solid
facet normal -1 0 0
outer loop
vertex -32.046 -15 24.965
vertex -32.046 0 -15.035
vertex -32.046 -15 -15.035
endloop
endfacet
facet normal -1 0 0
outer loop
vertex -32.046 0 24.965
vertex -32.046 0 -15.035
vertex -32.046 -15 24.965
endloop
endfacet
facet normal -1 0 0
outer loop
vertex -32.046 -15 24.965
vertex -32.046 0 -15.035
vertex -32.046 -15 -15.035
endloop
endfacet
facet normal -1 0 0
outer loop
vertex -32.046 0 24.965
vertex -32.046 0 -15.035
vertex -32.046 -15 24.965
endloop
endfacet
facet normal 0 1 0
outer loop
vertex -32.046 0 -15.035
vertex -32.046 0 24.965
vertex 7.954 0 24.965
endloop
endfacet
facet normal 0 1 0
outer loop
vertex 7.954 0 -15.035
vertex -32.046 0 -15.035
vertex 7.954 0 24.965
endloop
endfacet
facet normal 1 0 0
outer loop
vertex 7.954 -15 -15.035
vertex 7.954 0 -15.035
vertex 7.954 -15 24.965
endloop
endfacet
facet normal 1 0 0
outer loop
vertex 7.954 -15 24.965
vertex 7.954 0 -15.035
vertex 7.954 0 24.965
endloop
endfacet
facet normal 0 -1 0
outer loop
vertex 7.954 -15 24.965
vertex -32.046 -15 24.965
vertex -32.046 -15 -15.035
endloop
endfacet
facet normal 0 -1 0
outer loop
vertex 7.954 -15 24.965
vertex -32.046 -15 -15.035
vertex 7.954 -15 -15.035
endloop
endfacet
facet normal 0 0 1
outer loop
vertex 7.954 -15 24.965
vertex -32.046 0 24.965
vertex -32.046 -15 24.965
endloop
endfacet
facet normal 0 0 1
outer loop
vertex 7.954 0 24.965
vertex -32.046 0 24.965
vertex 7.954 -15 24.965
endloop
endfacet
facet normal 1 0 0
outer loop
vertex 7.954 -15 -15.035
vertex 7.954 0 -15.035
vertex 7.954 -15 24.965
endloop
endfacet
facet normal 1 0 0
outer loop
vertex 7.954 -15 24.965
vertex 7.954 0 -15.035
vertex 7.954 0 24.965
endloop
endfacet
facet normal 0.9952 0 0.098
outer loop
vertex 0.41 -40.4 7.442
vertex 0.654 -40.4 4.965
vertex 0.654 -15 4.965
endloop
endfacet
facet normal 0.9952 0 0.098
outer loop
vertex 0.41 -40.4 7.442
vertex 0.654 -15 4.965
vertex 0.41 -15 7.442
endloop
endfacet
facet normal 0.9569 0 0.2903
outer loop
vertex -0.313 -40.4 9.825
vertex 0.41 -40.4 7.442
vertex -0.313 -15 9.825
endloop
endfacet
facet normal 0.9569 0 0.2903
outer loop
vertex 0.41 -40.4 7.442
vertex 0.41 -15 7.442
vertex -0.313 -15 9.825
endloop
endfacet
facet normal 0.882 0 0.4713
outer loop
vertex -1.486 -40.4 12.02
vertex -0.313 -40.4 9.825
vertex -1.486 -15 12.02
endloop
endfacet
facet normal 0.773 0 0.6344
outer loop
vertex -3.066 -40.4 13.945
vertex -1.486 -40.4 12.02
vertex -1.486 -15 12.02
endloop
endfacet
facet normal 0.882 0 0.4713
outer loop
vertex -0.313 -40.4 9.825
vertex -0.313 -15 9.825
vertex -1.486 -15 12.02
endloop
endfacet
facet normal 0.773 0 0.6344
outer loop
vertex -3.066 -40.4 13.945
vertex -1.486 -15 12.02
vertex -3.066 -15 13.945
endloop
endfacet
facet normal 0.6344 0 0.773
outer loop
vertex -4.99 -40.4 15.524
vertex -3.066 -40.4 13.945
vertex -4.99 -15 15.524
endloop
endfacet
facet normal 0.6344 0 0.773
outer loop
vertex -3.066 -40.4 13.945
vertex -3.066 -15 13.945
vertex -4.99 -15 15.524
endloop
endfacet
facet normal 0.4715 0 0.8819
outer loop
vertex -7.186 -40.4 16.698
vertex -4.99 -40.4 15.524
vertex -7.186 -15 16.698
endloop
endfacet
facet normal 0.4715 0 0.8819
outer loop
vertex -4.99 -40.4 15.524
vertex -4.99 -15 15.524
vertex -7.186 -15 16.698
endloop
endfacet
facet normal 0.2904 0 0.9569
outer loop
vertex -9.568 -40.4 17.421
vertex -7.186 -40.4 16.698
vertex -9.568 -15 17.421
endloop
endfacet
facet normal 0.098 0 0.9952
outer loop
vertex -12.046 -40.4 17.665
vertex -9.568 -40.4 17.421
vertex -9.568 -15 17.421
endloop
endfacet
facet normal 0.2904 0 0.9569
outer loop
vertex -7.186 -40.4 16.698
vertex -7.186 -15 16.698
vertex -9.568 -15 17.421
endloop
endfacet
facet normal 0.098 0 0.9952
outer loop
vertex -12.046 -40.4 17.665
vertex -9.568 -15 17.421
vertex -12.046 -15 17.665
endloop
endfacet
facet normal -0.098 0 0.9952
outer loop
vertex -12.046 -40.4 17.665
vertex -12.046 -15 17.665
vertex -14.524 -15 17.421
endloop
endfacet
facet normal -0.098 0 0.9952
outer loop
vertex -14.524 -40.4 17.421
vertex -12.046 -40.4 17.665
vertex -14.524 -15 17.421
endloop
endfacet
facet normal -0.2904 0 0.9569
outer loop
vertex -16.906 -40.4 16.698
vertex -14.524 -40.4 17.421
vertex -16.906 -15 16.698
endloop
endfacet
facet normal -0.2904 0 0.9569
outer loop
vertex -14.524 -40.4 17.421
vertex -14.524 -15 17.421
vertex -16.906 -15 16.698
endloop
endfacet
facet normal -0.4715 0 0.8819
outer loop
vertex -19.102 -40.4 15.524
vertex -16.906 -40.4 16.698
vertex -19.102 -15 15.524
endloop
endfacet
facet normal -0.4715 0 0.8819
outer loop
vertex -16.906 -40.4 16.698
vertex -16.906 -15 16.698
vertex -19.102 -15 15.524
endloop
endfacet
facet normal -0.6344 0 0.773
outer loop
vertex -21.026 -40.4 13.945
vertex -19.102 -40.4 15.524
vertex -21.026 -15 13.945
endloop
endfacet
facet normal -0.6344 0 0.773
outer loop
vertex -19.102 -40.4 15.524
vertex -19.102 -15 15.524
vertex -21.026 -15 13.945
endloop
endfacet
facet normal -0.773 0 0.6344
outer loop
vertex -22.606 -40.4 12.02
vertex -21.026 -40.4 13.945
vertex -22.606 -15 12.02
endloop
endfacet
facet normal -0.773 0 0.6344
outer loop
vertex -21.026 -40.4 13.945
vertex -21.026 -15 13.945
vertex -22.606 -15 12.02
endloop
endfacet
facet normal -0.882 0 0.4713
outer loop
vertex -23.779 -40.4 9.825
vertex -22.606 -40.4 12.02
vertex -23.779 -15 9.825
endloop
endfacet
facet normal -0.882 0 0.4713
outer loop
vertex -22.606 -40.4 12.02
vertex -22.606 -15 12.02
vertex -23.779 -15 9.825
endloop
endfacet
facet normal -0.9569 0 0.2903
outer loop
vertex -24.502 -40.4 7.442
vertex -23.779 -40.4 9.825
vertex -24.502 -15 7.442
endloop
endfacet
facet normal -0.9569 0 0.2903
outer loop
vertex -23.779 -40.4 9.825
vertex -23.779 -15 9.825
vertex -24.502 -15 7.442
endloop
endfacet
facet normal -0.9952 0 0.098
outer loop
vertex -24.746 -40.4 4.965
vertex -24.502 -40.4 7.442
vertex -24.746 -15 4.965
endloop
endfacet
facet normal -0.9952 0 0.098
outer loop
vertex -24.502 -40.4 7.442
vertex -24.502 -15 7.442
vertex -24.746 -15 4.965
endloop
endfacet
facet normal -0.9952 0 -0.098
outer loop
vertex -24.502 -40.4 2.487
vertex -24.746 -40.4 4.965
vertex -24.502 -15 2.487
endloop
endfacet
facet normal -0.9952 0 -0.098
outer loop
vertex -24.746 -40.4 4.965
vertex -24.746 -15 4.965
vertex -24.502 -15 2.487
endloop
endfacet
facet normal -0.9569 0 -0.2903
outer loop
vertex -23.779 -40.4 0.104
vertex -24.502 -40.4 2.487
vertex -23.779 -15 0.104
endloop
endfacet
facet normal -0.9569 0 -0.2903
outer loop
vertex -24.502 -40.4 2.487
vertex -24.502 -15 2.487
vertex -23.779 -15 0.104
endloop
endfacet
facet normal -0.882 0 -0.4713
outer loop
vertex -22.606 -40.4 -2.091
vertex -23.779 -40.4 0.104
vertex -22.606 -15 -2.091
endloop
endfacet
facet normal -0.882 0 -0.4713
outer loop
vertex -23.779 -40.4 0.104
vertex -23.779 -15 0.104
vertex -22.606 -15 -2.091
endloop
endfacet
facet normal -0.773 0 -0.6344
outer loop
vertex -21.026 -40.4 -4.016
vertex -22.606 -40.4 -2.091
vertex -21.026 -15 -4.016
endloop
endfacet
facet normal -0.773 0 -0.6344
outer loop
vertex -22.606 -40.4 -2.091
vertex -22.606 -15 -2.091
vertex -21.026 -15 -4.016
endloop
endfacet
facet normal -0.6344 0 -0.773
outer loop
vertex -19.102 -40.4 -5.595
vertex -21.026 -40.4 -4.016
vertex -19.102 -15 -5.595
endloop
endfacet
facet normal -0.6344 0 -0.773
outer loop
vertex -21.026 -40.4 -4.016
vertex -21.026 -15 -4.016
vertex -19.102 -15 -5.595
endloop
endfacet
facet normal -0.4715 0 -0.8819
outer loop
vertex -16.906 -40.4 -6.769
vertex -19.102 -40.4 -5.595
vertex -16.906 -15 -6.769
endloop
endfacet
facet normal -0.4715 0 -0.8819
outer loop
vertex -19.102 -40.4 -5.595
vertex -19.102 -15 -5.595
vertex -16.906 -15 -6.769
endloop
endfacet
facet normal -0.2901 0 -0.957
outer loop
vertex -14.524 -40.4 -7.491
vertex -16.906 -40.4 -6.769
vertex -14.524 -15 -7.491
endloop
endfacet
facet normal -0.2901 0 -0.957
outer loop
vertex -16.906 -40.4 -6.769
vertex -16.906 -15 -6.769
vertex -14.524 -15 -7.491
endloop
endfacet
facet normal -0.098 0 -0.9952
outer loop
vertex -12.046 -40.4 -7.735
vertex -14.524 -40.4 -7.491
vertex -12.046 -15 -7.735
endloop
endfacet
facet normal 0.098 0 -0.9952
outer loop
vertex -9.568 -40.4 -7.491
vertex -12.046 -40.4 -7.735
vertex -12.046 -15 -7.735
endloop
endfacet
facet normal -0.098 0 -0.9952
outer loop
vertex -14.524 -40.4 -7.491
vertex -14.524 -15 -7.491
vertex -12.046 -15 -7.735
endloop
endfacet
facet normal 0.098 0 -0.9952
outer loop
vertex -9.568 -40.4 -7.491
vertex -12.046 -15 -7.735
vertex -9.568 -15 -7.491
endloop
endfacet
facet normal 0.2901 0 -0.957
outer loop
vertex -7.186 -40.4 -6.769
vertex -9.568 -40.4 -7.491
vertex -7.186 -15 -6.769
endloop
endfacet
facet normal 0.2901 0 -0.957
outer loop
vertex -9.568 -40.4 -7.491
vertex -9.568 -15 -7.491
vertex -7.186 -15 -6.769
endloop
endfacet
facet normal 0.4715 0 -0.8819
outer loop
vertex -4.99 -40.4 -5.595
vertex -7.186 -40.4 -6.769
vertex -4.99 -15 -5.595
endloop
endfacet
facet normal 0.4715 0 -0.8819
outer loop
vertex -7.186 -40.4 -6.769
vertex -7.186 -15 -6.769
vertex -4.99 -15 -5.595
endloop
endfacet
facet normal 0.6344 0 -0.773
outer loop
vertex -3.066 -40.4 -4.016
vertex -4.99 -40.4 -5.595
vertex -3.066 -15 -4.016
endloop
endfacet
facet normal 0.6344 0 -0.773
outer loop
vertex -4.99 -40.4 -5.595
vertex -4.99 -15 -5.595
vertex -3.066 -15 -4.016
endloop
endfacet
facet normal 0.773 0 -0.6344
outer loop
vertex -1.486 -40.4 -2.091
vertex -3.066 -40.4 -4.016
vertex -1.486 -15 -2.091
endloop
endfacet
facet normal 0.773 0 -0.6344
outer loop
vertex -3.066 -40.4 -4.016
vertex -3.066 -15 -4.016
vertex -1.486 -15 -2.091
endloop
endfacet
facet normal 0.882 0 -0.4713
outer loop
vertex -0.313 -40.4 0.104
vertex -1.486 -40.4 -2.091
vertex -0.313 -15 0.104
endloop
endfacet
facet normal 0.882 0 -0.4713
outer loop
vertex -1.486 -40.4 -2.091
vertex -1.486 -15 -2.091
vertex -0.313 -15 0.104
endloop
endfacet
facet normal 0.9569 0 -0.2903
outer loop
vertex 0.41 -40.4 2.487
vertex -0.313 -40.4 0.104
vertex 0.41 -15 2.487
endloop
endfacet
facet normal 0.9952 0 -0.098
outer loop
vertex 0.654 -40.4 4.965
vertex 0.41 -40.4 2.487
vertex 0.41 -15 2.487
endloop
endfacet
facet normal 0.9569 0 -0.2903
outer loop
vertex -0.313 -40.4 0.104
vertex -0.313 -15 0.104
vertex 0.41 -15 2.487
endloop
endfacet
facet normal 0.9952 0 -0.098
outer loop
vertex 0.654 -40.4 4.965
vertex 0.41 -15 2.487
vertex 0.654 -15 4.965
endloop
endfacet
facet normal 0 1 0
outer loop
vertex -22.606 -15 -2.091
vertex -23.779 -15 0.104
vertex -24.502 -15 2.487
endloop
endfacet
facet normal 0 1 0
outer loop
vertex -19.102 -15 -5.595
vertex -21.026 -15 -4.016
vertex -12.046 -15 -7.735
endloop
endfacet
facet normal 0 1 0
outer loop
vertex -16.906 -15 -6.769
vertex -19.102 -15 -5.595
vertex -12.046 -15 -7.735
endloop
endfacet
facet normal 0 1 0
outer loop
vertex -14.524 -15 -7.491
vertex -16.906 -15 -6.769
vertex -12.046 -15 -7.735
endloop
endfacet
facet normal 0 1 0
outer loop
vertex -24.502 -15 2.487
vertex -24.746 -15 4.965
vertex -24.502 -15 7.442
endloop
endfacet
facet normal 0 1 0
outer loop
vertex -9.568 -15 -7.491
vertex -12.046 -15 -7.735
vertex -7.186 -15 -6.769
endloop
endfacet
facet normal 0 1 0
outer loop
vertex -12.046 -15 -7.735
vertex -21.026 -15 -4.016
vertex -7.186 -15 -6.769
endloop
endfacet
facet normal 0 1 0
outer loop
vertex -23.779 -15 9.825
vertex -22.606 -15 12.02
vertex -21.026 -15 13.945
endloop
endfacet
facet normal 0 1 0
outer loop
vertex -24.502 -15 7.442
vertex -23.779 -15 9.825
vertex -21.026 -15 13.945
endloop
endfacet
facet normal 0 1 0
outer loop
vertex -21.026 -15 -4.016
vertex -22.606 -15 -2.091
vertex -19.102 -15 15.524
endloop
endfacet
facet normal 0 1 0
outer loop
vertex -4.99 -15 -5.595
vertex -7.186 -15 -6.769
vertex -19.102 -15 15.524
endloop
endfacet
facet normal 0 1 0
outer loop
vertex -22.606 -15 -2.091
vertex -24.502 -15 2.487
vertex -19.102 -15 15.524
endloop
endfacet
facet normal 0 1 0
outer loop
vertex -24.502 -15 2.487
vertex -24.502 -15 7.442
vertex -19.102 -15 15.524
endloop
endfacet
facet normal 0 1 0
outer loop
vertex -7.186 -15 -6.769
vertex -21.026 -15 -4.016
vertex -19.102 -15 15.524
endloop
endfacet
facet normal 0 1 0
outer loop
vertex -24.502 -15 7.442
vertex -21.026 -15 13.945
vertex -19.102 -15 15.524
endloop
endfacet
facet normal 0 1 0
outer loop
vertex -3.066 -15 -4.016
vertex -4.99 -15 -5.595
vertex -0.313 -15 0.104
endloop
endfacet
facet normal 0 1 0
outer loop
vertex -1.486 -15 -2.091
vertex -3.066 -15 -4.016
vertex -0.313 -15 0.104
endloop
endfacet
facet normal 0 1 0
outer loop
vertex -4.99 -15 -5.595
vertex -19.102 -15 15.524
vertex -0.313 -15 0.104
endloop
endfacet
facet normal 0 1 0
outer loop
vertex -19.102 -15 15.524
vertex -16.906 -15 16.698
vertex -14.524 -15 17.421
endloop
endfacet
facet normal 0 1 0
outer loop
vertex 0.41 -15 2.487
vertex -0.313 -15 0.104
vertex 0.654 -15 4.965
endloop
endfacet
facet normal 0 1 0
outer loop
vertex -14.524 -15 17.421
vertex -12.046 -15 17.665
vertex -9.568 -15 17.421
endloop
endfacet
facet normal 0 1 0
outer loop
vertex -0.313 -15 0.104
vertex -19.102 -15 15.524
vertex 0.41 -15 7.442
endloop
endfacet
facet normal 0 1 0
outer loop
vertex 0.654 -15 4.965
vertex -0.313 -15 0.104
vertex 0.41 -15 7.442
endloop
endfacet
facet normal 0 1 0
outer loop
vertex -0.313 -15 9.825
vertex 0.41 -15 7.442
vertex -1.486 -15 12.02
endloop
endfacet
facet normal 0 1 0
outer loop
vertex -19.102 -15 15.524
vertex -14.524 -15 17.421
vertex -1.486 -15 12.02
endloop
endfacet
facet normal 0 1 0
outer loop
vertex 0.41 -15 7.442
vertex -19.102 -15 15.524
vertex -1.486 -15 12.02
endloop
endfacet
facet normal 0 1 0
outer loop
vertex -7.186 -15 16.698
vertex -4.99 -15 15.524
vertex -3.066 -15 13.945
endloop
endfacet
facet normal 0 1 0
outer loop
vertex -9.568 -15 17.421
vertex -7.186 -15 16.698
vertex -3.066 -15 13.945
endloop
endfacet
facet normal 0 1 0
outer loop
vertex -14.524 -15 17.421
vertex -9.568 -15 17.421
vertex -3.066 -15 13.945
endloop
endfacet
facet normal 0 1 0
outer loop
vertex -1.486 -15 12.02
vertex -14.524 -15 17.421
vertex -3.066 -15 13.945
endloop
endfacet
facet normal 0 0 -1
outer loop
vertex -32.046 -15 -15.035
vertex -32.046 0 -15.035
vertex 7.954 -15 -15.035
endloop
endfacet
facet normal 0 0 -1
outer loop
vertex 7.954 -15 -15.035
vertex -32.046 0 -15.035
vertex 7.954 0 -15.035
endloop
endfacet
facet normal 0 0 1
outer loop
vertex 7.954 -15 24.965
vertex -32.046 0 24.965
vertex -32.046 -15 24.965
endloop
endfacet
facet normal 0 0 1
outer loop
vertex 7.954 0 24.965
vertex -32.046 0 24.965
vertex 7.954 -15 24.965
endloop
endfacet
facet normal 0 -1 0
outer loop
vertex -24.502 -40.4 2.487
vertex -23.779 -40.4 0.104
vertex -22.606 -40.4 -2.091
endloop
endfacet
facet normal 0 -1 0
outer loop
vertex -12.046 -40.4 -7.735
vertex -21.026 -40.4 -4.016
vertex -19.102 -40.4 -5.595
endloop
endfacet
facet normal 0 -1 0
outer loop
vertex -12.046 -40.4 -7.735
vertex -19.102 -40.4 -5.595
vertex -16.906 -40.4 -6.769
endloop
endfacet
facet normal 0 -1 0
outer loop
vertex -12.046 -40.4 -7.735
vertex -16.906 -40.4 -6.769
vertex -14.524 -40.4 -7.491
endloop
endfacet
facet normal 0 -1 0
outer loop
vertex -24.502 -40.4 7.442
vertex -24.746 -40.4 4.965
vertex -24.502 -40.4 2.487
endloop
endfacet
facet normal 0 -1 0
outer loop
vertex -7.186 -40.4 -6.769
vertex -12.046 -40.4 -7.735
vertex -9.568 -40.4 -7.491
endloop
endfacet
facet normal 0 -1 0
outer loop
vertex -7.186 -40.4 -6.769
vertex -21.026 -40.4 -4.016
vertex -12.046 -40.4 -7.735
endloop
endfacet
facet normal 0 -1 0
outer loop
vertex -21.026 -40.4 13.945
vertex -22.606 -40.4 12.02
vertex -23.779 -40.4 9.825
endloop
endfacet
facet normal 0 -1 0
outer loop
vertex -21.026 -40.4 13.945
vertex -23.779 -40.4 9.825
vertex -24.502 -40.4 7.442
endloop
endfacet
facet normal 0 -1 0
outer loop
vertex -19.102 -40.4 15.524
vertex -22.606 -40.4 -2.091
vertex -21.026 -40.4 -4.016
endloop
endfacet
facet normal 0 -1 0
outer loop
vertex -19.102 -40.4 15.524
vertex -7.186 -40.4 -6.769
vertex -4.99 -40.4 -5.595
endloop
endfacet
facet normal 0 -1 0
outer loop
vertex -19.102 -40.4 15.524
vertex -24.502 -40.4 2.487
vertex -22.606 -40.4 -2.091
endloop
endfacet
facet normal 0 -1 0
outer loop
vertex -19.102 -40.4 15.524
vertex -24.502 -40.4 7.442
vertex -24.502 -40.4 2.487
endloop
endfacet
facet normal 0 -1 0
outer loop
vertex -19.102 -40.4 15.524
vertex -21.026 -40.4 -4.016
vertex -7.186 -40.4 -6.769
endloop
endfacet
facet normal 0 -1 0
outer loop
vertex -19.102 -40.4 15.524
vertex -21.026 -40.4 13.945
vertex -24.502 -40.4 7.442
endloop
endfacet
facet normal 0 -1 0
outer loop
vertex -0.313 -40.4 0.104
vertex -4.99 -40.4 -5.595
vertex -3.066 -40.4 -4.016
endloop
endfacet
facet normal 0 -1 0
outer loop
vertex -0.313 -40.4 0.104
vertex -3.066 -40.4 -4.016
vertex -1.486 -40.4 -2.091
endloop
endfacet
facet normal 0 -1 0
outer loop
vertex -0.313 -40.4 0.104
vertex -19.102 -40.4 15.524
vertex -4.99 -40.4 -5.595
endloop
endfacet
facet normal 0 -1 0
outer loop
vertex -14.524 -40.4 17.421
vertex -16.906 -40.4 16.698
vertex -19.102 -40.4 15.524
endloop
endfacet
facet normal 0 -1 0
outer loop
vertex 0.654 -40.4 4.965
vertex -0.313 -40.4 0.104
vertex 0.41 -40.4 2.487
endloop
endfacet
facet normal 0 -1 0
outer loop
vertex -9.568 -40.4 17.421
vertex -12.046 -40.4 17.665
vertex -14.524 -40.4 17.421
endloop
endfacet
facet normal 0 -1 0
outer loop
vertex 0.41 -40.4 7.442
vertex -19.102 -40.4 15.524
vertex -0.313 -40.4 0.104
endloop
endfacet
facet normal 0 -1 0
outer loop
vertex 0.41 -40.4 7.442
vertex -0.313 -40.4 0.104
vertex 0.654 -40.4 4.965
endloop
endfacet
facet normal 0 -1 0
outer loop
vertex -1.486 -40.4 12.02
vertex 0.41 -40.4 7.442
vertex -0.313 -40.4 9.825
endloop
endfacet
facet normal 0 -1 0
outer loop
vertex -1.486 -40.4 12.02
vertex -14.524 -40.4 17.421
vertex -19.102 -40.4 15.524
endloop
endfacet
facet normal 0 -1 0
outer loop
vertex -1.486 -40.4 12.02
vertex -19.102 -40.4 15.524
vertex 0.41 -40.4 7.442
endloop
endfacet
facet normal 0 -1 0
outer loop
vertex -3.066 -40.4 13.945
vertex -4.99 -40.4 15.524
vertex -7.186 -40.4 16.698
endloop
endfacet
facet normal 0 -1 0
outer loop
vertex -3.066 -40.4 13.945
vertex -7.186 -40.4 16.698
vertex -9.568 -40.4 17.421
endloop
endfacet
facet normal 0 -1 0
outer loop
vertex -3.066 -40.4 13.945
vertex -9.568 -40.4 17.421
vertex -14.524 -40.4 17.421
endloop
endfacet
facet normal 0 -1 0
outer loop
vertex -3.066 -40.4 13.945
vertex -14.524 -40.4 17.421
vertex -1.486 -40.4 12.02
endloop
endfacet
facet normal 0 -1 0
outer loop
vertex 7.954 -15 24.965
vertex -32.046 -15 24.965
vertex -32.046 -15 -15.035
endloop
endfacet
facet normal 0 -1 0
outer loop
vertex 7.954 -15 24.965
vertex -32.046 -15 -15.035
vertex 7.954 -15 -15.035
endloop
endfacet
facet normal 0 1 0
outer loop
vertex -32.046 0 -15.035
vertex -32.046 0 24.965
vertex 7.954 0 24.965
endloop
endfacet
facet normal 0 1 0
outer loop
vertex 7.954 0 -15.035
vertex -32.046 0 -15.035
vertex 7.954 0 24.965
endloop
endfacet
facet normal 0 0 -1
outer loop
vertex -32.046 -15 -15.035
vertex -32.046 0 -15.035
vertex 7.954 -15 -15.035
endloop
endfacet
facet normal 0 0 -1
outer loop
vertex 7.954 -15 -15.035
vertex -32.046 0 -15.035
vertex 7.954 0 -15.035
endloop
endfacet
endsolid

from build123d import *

# Parameters (mm, degrees)
F0_W     = 40
F0_H     = 40
F1_DEPTH = 15
F2_DEPTH = 15
F3_R     = 12.7
F4_DEPTH = 25.4


with BuildPart() as f1:
    # F0 (on Front) → F1 (new body)
    with BuildSketch(Plane.XZ):
        with Locations((-12.045931, 4.964564)):
            Rectangle(F0_W, F0_H)
    extrude(amount=F1_DEPTH)


with BuildPart() as f2:
    # F0 (on Front) → F2 (new body)
    with BuildSketch(Plane.XZ):
        with Locations((-12.045931, 4.964564)):
            Rectangle(F0_W, F0_H)
    extrude(amount=F2_DEPTH)


with BuildPart() as f4:
    # F3 (on face) → F4 (new body)
    with BuildSketch(Plane.XZ.offset(15)):
        with Locations((-12.045931, 4.964564)):
            Circle(F3_R)
    extrude(amount=F4_DEPTH)


solid = Compound([f1.part, f2.part, f4.part])
